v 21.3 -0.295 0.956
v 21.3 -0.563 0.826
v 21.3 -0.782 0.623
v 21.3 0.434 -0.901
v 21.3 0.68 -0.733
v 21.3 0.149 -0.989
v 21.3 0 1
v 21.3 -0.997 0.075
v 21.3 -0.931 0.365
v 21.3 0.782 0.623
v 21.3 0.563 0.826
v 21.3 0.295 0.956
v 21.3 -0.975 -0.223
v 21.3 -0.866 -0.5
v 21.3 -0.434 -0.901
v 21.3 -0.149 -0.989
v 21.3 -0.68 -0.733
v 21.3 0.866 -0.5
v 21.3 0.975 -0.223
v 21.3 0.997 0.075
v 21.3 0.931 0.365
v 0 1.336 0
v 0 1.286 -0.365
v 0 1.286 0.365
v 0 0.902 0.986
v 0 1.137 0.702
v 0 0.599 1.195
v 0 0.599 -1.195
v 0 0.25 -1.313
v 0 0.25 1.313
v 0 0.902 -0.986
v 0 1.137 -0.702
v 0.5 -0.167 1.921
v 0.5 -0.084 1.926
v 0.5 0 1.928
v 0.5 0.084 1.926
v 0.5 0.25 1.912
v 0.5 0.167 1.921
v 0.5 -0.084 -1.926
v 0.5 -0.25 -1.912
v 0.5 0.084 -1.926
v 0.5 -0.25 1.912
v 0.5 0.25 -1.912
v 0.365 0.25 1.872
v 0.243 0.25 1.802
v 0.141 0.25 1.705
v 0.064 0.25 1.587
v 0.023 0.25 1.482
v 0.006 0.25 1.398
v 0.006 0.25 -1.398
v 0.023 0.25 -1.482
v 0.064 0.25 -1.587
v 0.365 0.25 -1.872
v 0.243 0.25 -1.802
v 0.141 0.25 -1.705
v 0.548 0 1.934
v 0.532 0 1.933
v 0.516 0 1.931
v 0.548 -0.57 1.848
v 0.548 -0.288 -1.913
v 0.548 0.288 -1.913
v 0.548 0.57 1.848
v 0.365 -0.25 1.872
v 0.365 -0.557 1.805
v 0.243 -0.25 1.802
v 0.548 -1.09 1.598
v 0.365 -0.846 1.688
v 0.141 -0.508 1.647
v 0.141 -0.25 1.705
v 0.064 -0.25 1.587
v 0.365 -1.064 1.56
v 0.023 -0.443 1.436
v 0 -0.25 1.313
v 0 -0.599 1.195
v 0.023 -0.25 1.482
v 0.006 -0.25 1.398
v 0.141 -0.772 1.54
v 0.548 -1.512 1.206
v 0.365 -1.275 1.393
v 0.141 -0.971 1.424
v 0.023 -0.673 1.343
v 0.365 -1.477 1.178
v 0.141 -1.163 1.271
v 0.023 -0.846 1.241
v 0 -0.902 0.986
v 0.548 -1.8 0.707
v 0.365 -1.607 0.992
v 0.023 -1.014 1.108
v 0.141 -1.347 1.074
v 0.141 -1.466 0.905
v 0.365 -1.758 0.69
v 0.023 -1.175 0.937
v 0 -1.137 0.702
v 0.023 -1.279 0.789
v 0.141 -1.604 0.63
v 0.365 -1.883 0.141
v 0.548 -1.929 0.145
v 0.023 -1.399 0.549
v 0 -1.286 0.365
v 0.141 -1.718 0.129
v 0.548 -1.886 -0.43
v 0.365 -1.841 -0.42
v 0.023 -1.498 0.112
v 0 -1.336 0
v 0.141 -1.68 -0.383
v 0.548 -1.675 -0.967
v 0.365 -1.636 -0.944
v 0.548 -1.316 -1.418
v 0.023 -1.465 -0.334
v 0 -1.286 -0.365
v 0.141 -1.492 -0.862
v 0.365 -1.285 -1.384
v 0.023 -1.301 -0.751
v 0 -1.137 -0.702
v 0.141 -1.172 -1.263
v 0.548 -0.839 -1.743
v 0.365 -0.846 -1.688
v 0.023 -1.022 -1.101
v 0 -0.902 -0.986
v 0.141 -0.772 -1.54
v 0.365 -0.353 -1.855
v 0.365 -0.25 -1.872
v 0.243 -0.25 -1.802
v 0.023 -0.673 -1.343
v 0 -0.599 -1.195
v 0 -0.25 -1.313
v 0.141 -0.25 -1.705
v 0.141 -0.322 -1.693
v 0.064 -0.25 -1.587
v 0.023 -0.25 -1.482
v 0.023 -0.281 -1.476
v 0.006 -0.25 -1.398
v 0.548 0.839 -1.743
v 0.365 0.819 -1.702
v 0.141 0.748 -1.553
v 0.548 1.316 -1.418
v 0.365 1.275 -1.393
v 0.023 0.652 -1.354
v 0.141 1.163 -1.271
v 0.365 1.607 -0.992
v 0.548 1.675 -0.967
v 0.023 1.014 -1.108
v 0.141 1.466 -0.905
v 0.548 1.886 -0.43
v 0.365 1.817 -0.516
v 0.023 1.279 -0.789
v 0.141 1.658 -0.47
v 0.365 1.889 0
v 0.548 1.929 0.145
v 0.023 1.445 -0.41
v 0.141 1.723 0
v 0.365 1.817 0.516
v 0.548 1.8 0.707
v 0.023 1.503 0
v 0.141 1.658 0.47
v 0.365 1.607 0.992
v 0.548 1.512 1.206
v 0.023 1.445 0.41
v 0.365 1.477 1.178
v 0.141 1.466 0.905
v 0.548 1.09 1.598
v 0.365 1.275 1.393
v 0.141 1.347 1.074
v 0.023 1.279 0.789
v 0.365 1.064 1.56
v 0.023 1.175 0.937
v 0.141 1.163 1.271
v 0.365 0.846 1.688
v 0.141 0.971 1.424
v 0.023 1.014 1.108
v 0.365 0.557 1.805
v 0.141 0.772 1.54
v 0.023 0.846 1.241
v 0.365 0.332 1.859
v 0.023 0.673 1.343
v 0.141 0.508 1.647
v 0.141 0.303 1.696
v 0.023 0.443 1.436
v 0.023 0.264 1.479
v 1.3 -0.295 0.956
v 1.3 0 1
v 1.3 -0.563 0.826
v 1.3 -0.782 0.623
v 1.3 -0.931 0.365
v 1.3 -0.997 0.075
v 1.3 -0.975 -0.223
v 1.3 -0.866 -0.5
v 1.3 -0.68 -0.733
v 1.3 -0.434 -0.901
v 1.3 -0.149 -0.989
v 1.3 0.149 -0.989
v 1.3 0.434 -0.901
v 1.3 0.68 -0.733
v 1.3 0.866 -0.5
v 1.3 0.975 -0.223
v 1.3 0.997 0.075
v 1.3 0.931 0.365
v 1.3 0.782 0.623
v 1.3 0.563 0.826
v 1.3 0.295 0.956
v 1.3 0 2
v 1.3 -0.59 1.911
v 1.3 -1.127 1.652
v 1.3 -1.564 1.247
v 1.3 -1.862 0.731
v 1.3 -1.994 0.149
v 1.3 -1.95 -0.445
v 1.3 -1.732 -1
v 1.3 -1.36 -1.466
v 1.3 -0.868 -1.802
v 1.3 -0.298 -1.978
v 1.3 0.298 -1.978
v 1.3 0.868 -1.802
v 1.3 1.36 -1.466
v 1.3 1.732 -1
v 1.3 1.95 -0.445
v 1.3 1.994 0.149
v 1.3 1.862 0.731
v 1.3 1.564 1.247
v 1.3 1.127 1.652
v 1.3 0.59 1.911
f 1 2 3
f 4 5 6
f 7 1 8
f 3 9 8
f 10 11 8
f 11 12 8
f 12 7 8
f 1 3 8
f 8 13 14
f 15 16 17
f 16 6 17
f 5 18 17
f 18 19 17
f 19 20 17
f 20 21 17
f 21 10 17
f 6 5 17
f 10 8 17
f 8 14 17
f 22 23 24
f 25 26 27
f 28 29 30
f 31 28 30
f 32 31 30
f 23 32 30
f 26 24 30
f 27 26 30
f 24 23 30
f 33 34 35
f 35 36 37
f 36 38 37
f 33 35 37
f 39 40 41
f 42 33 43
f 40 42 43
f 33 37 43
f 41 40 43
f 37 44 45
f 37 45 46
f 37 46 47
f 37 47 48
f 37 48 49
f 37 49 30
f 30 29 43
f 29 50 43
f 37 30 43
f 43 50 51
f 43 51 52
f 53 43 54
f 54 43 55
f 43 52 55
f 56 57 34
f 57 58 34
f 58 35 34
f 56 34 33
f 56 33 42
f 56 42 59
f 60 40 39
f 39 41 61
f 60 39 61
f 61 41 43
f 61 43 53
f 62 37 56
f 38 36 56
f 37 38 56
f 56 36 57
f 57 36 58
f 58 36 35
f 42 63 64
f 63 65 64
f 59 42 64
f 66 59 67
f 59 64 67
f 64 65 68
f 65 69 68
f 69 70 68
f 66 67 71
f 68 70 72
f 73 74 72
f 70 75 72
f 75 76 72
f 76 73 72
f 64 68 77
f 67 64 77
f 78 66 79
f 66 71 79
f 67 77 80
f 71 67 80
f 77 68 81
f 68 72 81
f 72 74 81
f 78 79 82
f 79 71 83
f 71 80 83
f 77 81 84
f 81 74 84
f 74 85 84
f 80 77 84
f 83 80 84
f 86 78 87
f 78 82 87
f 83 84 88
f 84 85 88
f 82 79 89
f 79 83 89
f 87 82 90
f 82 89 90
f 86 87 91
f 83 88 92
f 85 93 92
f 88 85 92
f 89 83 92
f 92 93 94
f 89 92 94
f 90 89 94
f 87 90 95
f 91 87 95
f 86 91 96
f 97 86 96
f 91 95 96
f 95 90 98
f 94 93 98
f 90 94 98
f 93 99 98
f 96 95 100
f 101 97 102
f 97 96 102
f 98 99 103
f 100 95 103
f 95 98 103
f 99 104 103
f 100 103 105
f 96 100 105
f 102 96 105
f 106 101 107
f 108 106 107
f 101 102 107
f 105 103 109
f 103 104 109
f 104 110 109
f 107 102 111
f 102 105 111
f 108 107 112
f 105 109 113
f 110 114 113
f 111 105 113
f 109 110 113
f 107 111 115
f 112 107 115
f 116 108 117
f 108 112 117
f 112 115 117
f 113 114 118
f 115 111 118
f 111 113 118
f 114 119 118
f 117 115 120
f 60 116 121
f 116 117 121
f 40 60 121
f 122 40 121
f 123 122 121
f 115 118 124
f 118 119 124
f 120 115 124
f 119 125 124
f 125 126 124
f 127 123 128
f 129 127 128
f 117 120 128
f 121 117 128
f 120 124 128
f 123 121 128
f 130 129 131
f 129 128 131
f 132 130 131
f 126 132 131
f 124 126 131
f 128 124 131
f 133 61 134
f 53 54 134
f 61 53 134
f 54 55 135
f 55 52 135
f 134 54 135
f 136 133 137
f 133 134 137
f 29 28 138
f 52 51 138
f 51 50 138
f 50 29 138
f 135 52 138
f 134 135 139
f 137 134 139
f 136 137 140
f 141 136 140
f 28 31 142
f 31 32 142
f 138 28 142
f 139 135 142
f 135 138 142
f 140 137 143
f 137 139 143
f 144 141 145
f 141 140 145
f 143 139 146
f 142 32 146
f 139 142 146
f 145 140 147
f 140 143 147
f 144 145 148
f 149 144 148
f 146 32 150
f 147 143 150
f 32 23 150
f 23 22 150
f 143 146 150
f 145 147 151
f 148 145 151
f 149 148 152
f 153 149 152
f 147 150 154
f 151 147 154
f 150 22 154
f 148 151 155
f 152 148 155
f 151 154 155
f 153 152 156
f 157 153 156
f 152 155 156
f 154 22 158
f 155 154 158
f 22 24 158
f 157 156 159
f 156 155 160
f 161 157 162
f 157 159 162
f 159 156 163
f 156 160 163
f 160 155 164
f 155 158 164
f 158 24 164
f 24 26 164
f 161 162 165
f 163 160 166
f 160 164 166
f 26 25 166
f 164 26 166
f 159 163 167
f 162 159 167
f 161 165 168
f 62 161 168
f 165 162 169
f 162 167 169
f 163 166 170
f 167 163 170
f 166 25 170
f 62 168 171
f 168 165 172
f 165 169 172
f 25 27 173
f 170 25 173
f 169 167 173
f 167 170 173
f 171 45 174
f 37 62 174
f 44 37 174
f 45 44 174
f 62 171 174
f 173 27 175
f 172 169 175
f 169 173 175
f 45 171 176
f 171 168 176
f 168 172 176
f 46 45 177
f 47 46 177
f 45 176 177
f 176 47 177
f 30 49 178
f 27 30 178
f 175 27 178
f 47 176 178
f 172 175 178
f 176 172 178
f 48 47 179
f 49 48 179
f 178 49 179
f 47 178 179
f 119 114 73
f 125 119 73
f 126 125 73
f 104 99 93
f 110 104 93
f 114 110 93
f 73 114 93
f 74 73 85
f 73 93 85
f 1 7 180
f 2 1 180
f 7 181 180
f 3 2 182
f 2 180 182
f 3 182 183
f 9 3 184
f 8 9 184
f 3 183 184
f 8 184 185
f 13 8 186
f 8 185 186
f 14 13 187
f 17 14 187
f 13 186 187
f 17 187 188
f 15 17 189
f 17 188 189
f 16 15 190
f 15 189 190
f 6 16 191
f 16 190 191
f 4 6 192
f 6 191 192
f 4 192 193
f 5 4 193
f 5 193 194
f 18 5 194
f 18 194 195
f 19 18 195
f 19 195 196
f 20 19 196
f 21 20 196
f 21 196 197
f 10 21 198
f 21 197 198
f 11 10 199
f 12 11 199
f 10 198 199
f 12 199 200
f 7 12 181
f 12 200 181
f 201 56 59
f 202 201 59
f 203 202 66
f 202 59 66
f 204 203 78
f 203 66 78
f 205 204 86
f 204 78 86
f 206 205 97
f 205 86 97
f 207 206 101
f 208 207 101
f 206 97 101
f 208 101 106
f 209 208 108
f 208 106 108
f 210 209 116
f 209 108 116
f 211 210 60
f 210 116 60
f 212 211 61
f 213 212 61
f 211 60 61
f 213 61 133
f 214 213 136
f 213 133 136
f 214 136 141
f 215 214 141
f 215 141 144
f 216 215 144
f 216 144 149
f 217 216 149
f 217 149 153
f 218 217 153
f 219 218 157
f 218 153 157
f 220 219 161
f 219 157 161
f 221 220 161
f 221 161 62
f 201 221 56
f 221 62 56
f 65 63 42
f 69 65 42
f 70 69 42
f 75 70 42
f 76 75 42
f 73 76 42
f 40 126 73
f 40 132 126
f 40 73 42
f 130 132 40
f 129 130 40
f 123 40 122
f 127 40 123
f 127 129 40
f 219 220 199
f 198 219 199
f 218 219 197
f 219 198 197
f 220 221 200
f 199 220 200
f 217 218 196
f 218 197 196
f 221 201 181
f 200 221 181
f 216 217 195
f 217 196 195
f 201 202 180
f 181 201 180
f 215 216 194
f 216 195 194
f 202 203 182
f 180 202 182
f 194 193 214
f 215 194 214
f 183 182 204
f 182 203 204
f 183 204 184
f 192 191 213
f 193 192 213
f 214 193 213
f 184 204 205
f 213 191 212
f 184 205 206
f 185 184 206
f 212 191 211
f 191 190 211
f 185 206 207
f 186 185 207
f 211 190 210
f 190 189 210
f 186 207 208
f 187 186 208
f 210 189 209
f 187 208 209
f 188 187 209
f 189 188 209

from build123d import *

# Parameters (mm, degrees)
FILLET2_R  = 0.6
SKETCH2_W  = 4
SKETCH2_H  = 0.5
SLOT_DEPTH = 0.5


with BuildPart() as part:
    # BodySke → Base-Revolve (revolve)
    with BuildSketch(Plane.XY, mode=Mode.PRIVATE) as base_revolve_sk:
        Polygon((1.3, 1), (1.3, 2), (0, 1.886264737), (0, 0), (21.3, 0), (21.3, 1), align=None)
    revolve(base_revolve_sk.sketch.rotate(Axis((-25.4, 0, 0), (1, 0, 0)), 90), axis=Axis((-25.4, 0, 0), (1, 0, 0)))

    # Fillet2
    fillet2_edges = [part.edges().sort_by_distance(p)[0] for p in [
        (0, 0, -1.886264737),
    ]]
    fillet(fillet2_edges, radius=FILLET2_R)

    # Sketch2 → Slot (cut)
    with BuildSketch(Plane(origin=(0, 0, 0), x_dir=(0, 0, -1), z_dir=(1, 0, 0))):
        Rectangle(SKETCH2_W, SKETCH2_H)
    extrude(amount=SLOT_DEPTH, mode=Mode.SUBTRACT)


solid = part.part
